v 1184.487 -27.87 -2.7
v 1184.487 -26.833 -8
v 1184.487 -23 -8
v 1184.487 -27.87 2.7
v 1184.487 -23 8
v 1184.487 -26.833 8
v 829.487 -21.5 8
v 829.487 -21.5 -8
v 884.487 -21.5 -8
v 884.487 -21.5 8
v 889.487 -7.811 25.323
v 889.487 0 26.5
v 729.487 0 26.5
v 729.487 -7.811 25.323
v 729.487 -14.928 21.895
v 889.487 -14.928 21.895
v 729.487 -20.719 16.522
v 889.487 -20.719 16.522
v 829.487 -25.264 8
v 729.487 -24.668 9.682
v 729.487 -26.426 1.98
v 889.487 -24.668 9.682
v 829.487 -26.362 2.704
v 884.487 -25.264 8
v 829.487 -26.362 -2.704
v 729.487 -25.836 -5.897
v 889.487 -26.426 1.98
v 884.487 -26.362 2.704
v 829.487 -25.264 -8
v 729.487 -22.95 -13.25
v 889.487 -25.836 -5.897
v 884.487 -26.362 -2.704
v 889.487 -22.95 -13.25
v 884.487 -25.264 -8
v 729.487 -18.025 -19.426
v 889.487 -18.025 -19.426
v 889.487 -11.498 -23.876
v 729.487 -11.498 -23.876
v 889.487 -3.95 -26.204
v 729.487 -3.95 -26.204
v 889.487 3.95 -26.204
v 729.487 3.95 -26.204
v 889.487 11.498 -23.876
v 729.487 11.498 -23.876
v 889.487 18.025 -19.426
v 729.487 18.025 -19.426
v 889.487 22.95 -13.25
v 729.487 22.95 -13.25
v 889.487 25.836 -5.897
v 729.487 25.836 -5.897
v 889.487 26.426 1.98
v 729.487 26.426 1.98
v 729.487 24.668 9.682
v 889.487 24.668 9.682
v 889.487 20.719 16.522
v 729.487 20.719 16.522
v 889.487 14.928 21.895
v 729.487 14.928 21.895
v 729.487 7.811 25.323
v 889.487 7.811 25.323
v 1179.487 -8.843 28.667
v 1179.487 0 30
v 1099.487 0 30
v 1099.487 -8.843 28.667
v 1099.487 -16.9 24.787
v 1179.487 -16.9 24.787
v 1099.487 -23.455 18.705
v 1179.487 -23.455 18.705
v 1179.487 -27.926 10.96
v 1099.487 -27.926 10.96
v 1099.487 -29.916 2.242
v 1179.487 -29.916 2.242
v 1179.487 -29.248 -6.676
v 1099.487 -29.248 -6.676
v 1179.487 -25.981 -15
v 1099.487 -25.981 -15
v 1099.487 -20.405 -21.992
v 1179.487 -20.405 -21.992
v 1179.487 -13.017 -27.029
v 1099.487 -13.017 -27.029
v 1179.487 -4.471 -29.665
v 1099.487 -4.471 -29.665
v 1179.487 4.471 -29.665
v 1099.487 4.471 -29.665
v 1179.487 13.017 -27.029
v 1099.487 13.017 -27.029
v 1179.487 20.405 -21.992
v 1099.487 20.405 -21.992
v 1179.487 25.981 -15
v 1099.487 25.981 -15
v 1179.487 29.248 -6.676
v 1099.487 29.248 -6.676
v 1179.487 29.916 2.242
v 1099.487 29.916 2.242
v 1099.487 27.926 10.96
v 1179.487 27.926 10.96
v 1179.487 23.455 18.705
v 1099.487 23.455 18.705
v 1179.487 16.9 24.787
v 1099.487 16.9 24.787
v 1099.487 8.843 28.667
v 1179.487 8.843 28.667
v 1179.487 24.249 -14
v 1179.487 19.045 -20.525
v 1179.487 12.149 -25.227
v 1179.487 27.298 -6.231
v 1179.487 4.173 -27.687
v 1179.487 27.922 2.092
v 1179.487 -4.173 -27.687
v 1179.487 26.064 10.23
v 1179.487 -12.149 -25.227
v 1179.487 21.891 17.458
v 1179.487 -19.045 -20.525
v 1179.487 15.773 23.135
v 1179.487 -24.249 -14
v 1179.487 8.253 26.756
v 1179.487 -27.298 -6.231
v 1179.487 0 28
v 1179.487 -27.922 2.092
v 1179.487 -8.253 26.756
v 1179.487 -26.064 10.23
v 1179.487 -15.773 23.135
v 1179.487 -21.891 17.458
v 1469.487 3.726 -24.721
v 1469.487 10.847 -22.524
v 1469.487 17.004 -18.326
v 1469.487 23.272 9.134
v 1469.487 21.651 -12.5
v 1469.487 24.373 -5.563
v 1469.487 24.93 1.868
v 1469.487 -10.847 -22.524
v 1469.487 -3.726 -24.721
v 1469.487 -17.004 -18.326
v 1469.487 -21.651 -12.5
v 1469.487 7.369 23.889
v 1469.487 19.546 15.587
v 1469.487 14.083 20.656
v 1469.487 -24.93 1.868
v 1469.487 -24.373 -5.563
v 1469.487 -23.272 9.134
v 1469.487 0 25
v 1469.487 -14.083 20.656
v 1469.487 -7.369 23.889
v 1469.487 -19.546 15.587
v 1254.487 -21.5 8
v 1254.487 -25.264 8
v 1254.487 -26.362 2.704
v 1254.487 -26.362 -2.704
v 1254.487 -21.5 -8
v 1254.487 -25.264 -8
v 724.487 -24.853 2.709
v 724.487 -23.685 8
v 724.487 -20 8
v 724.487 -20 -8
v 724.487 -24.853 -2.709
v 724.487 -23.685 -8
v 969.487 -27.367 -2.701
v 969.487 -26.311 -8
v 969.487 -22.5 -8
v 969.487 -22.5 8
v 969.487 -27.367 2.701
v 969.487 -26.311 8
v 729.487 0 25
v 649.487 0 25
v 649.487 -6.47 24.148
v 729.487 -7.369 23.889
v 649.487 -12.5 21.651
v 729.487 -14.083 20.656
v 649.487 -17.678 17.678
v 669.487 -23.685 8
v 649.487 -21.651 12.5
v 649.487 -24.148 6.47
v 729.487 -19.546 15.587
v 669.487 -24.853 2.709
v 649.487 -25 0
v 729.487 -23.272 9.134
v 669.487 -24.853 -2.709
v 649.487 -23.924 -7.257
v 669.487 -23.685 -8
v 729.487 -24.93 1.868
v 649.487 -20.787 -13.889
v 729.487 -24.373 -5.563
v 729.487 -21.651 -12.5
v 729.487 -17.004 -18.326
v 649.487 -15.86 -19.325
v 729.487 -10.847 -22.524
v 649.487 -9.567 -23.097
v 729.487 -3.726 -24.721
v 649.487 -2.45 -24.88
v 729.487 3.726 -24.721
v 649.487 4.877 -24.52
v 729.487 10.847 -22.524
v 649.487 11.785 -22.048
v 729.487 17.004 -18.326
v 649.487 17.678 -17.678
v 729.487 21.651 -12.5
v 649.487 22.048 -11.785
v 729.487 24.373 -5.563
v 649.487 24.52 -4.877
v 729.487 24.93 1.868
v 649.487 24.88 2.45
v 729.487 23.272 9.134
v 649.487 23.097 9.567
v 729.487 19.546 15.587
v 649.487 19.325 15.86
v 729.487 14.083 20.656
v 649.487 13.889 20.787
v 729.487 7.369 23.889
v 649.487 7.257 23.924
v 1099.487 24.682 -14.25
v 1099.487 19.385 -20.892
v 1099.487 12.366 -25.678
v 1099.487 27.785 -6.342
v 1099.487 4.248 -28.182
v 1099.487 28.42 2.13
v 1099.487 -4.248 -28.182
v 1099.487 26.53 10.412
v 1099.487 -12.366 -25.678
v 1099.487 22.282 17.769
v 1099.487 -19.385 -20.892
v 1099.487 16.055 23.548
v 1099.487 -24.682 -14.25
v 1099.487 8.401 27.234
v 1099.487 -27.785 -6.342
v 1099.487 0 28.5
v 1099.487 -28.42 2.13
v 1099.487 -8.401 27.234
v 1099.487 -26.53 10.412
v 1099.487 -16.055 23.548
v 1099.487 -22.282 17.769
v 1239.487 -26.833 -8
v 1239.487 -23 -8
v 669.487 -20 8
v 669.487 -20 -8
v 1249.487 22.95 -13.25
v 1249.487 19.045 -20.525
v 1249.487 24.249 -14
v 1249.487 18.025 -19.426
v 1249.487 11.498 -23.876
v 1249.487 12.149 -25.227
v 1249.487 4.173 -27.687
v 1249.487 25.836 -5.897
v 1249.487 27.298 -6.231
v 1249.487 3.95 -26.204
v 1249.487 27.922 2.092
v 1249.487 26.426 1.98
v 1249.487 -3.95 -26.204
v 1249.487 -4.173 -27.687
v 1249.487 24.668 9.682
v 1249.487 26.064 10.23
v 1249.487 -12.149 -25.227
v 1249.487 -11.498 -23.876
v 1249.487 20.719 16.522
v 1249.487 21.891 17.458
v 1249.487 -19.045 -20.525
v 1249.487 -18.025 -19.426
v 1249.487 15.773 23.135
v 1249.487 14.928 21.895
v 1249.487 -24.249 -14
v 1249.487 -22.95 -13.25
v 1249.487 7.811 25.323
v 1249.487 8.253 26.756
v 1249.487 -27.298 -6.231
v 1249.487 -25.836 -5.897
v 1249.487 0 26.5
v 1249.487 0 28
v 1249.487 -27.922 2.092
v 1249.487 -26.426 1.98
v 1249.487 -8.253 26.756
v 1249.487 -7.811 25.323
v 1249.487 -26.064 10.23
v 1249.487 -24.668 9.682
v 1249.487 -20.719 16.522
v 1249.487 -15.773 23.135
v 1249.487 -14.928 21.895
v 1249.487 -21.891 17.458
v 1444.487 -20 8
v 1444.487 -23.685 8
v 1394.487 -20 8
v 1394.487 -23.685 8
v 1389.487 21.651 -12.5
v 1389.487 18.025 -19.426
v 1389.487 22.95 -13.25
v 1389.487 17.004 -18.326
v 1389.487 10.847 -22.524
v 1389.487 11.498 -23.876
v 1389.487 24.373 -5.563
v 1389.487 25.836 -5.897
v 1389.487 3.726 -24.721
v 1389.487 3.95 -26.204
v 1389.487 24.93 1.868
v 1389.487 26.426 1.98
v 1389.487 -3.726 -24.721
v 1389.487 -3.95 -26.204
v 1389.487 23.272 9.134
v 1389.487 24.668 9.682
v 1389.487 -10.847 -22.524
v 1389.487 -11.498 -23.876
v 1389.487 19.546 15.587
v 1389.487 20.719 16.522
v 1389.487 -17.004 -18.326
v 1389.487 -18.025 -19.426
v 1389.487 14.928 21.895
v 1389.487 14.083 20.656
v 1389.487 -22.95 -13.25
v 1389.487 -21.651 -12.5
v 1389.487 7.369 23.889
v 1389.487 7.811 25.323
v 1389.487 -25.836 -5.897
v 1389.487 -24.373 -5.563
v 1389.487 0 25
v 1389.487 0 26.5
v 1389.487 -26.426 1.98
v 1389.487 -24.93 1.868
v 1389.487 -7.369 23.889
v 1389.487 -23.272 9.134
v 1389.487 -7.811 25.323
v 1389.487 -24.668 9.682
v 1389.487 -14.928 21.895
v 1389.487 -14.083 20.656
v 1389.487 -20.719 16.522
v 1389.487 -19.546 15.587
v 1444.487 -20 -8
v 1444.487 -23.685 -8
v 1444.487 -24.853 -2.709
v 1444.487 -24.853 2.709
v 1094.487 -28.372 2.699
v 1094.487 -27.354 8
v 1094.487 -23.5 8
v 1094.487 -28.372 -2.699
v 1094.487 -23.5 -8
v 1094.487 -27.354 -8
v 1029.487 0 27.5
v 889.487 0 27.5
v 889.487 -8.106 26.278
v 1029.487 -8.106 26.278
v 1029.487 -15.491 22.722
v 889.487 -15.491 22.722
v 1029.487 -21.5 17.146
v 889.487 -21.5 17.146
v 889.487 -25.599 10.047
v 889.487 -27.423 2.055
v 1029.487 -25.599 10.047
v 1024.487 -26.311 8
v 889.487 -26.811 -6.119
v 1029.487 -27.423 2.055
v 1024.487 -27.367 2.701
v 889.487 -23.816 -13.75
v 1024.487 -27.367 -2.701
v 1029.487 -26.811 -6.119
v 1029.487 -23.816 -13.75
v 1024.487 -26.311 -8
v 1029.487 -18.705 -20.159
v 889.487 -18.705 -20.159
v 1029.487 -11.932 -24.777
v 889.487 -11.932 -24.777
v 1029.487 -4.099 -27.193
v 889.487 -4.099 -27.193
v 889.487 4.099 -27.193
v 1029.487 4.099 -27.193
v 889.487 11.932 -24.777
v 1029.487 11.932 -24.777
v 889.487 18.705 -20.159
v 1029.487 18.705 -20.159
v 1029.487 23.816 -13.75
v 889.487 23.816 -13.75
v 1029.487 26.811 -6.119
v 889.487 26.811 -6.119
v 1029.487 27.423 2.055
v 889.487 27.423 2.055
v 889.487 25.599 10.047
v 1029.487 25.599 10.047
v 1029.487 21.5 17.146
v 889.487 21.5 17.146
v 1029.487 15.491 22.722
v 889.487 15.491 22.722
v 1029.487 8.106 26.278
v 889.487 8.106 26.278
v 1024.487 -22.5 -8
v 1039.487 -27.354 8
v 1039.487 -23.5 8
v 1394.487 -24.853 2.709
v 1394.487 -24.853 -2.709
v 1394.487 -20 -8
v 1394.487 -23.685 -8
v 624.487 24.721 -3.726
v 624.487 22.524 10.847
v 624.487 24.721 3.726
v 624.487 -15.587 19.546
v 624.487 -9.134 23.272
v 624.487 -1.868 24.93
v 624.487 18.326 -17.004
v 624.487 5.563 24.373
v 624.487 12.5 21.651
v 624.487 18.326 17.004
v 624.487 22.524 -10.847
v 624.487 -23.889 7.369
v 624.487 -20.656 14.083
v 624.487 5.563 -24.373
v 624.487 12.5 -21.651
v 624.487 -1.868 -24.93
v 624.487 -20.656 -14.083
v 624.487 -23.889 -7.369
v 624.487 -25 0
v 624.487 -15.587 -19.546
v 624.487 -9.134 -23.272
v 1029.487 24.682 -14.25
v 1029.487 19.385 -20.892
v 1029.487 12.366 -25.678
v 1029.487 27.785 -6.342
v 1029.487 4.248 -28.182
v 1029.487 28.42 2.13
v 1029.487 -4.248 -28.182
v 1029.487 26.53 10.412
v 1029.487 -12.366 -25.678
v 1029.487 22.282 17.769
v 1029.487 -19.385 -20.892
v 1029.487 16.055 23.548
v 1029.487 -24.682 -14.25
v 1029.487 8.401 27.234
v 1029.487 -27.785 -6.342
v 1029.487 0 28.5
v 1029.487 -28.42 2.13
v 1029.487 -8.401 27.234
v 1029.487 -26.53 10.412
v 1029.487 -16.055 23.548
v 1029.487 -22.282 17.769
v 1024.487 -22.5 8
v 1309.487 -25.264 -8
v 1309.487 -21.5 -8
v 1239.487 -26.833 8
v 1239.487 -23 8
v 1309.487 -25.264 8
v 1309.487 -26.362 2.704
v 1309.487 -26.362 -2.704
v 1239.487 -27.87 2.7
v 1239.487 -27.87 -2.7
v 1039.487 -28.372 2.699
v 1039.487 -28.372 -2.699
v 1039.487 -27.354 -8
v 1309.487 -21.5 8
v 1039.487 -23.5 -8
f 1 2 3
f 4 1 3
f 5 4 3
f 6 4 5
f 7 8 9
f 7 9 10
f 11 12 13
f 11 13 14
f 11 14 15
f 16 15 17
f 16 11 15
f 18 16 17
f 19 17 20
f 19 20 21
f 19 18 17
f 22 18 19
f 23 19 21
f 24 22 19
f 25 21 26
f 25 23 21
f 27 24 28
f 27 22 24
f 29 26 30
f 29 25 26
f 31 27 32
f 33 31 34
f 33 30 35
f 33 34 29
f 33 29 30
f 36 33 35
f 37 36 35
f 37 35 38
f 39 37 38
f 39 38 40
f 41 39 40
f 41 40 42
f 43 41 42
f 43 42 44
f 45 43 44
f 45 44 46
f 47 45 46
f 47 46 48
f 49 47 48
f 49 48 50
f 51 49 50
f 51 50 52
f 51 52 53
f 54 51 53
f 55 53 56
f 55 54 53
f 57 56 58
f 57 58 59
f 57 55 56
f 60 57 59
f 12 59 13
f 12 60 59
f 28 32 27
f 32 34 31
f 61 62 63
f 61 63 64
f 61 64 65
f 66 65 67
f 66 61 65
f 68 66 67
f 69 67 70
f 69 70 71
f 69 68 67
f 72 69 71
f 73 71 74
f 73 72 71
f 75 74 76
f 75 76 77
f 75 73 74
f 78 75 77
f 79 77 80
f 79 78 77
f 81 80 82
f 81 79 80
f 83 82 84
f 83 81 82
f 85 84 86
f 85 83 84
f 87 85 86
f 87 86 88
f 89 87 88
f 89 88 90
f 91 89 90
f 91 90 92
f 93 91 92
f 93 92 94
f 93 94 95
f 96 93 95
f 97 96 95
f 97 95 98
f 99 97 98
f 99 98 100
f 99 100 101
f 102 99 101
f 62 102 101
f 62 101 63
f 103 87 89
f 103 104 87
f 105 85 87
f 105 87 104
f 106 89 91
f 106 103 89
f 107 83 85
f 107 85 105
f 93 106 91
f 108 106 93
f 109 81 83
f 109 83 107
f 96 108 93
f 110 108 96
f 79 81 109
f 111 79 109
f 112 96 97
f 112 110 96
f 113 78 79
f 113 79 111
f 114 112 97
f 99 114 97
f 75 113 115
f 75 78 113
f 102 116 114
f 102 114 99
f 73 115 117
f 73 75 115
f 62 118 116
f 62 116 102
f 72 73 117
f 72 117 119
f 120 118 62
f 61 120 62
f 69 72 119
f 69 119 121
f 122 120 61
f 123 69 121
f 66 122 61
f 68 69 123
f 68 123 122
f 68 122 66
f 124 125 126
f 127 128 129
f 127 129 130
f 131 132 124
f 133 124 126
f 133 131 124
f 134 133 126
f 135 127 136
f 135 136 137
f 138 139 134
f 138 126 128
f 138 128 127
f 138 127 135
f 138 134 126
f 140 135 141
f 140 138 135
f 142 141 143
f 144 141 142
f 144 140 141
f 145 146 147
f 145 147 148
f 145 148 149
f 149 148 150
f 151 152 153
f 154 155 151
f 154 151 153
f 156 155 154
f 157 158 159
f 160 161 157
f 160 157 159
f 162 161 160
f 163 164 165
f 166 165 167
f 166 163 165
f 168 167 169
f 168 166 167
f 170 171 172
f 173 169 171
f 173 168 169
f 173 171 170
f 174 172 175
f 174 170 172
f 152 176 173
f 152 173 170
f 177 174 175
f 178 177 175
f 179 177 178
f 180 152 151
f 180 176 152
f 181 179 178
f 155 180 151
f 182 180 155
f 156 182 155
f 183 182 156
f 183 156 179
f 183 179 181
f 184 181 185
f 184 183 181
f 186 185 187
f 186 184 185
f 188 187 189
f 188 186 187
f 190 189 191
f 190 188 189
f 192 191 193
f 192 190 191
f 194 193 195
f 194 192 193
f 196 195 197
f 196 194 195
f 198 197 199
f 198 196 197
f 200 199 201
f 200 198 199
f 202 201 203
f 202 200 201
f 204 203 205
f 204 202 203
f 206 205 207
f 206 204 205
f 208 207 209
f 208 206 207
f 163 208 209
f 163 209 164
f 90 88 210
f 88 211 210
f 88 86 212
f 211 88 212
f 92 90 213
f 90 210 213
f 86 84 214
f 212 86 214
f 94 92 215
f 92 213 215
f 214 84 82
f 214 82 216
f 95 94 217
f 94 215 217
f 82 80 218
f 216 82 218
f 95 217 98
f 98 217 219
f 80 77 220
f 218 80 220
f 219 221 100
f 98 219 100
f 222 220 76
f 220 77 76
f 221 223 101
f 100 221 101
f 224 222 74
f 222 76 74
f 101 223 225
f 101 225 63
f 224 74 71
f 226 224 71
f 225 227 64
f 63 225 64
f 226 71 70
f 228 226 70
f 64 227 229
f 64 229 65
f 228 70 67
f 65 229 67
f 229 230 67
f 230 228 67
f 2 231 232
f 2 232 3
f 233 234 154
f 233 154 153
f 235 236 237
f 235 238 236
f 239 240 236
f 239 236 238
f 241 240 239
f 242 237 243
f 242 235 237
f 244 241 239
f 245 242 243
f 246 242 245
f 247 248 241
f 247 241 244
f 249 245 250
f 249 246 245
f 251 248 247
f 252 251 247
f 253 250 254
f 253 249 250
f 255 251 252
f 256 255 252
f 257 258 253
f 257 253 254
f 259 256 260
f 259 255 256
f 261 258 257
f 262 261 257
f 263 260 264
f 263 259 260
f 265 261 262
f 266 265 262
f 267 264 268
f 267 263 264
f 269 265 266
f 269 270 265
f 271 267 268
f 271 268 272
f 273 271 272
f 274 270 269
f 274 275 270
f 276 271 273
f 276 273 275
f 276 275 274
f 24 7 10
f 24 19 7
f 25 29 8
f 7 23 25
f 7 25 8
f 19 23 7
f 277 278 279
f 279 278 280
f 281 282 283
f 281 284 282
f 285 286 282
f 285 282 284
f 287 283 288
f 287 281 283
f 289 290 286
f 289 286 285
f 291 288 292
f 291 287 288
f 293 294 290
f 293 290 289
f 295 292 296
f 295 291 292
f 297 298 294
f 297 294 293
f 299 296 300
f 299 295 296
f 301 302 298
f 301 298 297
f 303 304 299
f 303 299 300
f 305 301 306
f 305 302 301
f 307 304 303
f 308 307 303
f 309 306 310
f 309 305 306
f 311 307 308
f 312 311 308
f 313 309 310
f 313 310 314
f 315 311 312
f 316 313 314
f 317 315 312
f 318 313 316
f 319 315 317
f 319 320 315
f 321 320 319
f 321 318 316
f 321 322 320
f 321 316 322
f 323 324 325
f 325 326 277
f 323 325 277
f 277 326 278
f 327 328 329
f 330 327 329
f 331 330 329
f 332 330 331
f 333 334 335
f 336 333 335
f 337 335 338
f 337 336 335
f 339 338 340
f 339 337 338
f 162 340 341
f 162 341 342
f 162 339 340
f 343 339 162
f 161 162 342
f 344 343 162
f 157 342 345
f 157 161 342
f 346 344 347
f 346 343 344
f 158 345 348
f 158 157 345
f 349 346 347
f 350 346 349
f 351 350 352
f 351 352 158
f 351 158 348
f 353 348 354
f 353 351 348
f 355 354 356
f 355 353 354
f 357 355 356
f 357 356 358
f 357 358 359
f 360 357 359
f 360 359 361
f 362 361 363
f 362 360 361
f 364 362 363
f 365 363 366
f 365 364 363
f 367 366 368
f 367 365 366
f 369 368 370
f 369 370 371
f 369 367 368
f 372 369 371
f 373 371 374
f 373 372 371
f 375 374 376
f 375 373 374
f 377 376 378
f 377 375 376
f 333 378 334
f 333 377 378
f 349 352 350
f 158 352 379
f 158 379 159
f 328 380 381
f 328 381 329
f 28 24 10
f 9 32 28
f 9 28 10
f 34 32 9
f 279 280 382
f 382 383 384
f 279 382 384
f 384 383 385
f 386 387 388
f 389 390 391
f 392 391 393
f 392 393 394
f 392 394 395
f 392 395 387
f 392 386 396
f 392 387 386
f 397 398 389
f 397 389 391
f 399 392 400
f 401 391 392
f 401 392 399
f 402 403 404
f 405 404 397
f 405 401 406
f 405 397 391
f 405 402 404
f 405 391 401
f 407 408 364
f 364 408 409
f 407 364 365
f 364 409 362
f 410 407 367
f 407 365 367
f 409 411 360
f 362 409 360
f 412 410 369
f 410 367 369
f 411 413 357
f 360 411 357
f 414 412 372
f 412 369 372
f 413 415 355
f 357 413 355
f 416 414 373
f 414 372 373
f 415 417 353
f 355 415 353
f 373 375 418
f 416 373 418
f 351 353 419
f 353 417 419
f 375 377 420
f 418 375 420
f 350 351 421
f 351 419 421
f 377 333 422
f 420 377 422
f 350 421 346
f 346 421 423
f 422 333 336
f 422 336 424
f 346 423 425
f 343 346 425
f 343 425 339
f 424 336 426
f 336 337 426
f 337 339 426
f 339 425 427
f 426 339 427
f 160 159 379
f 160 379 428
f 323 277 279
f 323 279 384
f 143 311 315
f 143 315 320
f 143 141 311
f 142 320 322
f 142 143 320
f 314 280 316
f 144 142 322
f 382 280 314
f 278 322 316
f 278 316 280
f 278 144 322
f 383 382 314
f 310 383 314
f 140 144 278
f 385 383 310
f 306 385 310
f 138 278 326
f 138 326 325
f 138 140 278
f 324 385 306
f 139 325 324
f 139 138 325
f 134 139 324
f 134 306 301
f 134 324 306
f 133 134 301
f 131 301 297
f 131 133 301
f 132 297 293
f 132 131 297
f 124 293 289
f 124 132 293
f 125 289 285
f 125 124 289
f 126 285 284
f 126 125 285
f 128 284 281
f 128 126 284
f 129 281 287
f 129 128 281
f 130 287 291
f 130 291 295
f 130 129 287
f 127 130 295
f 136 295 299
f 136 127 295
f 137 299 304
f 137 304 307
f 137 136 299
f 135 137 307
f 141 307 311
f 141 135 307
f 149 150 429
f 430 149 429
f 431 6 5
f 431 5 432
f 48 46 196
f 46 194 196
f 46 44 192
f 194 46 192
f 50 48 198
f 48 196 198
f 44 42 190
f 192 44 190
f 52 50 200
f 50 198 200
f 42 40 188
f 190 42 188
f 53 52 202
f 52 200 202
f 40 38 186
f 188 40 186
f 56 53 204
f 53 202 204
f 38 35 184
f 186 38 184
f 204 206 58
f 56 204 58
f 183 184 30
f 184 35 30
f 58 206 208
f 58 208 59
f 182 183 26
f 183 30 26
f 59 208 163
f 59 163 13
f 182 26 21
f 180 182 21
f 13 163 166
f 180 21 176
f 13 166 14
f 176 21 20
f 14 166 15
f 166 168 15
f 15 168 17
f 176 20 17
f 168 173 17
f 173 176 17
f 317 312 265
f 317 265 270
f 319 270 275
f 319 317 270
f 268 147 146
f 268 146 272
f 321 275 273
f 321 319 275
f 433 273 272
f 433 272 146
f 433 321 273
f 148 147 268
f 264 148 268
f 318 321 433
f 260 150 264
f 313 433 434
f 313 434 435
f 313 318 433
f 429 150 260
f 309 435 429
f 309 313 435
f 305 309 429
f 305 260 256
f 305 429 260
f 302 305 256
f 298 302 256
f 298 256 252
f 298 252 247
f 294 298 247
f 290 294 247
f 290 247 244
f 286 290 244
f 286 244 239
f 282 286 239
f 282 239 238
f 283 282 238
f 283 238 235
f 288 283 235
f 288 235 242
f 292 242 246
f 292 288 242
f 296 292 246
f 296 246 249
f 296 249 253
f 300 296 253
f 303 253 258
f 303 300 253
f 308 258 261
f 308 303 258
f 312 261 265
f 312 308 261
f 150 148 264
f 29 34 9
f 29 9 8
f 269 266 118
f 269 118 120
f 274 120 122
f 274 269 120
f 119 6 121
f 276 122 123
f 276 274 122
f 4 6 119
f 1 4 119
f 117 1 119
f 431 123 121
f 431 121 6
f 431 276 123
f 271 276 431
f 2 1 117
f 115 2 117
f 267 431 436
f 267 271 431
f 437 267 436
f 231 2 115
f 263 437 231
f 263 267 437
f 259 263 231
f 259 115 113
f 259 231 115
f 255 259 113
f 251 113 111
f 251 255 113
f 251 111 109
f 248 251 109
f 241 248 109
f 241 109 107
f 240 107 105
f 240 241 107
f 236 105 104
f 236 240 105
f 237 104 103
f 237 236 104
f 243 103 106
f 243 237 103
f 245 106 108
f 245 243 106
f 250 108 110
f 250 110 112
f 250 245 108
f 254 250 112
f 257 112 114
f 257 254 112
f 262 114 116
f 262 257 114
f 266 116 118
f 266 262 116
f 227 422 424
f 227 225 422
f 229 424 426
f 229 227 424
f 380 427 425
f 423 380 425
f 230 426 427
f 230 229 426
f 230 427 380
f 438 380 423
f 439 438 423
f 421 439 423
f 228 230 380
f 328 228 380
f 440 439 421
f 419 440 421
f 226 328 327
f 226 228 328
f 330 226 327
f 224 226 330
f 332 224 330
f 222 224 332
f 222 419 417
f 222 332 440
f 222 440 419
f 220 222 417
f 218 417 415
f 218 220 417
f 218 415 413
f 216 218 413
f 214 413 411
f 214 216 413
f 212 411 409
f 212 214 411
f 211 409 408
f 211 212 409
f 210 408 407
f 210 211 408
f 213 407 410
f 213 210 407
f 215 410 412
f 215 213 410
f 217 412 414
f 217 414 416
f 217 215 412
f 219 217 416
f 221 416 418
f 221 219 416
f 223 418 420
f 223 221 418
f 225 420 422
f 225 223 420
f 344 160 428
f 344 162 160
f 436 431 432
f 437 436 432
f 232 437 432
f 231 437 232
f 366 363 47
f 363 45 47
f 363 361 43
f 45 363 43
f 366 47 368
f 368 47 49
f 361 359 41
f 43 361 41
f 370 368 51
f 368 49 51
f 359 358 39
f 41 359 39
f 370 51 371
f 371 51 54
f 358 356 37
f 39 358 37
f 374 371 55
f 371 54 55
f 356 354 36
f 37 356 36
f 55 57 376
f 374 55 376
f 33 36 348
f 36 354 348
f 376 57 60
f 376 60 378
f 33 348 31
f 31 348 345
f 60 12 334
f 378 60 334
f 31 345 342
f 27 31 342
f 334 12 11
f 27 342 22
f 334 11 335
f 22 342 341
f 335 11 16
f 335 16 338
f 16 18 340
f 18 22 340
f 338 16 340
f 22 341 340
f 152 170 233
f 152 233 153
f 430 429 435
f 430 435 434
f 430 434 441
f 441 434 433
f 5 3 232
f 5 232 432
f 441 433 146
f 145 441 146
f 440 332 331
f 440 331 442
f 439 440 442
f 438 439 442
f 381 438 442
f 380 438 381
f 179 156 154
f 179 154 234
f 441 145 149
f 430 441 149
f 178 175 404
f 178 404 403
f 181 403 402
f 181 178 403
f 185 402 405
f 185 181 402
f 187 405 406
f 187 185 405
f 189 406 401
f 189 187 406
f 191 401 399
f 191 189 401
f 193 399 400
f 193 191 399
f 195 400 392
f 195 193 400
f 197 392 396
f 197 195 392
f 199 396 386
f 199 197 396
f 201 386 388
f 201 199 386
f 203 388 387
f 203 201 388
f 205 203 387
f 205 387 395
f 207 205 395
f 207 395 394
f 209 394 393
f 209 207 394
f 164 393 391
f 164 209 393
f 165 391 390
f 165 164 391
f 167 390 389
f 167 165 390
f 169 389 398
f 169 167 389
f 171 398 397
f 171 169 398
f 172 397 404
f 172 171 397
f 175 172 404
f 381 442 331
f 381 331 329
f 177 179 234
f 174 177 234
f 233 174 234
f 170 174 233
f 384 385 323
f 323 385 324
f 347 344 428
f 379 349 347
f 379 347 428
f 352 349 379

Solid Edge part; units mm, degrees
sketch "Sketch1" plane through (0, 0, 0) normal (0, -1, 0) x (1, 0, 0)
  line L0 (1469.4867, 25) -> (1469.4867, 0)
  line L1 (1469.4867, 0) -> (649.4867, 0)
  line L2 (649.4867, 0) -> (649.4867, 25)
  line L3 (649.4867, 25) -> (729.4867, 25)
  line L4 (729.4867, 25) -> (729.4867, 26.5)
  line L5 (729.4867, 26.5) -> (889.4867, 26.5)
  line L6 (889.4867, 26.5) -> (889.4867, 27.5)
  line L7 (889.4867, 27.5) -> (1029.4867, 27.5)
  line L8 (1029.4867, 27.5) -> (1029.4867, 28.5)
  line L9 (1029.4867, 28.5) -> (1099.4867, 28.5)
  line L10 (1099.4867, 28.5) -> (1099.4867, 30)
  line L11 (1099.4867, 30) -> (1179.4867, 30)
  line L12 (1179.4867, 30) -> (1179.4867, 28)
  line L13 (1179.4867, 28) -> (1249.4867, 28)
  line L14 (1249.4867, 28) -> (1249.4867, 26.5)
  line L15 (1249.4867, 26.5) -> (1389.4867, 26.5)
  line L16 (1389.4867, 26.5) -> (1389.4867, 25)
  line L17 (1389.4867, 25) -> (1469.4867, 25)
revolve "RevolvedProtrusion1" add sketch "Sketch1" angle 360 about axis through (0, 0, 0) along (1, 0, 0)
sketch "Sketch2" plane through (689.4867, -25, 0) normal (0, -1, 0) x (-1, 0, 0)
  line L0 (20, -8) -> (-35, -8)
  line L1 (-35, -8) -> (-35, 0)
  line L2 (-35, 0) -> (-35, 8)
  line L3 (-35, 8) -> (20, 8)
  line L4 (20, 8) -> (20, -8)
extrude "Cutout1" cut sketch "Sketch2" against normal blind 5
sketch "Sketch3" plane through (809.4867, -26.5, 0) normal (0, -1, 0) x (-1, 0, 0)
  line L0 (-75, 0) -> (-75, 8)
  line L1 (-75, 8) -> (-20, 8)
  line L2 (-20, 8) -> (-20, -8)
  line L3 (-20, -8) -> (-75, -8)
  line L4 (-75, -8) -> (-75, 0)
  dimension "D1" = 55
  dimension "D2" = 60
extrude "Cutout2" cut sketch "Sketch3" against normal blind 5
sketch "Sketch4" plane through (959.4867, -27.5, 0) normal (0, -1, 0) x (-1, 0, 0)
  line L0 (-65, 0) -> (-65, 8)
  line L1 (-65, 8) -> (-10, 8)
  line L2 (-10, 8) -> (-10, -8)
  line L3 (-10, -8) -> (-65, -8)
  line L4 (-65, -8) -> (-65, 0)
  dimension "D1" = 55
  dimension "D2" = 16
  dimension "D3" = 60
extrude "Keyway_Thickness" cut sketch "Sketch4" against normal blind 5
sketch "Sketch5" plane through (1064.4867, -28.5, 0) normal (0, -1, 0) x (-1, 0, 0)
  line L0 (-30, 0) -> (-30, 8)
  line L1 (-30, 8) -> (25, 8)
  line L2 (25, 8) -> (25, -8)
  line L3 (25, -8) -> (-30, -8)
  line L4 (-30, -8) -> (-30, 0)
  dimension "D1" = 55
  dimension "D2" = 16
  dimension "D3" = 60
extrude "Cutout3" cut sketch "Sketch5" against normal blind 5
sketch "Sketch6" plane through (1214.4867, -28, 0) normal (0, -1, 0) x (-1, 0, 0)
  line L0 (-25, 0) -> (-25, 8)
  line L1 (-25, 8) -> (30, 8)
  line L2 (30, 8) -> (30, -8)
  line L3 (30, -8) -> (-25, -8)
  line L4 (-25, -8) -> (-25, 0)
  dimension "D1" = 16
  dimension "D2" = 55
  dimension "D3" = 60
extrude "Cutout4" cut sketch "Sketch6" against normal blind 5
sketch "Sketch7" plane through (1319.4867, -26.5, 0) normal (0, -1, 0) x (-1, 0, 0)
  line L0 (65, 0) -> (65, 8)
  line L1 (65, 8) -> (10, 8)
  line L2 (10, 8) -> (10, -8)
  line L3 (10, -8) -> (65, -8)
  line L4 (65, -8) -> (65, 0)
  dimension "D1" = 55
  dimension "D2" = 16
  dimension "D3" = 60
extrude "Cutout5" cut sketch "Sketch7" against normal blind 5
sketch "Sketch8" plane through (1429.4867, -25, 0) normal (0, -1, 0) x (-1, 0, 0)
  line L0 (35, 0) -> (35, 8)
  line L1 (35, 8) -> (-20, 8)
  line L2 (-20, 8) -> (-20, -8)
  line L3 (-20, -8) -> (35, -8)
  line L4 (35, -8) -> (35, 0)
  dimension "D1" = 55
  dimension "D2" = 16
  dimension "D3" = 60
extrude "Cutout6" cut sketch "Sketch8" against normal blind 5
sketch "Sketch9" plane through (1469.4867, 0, 0) normal (1, 0, 0) x (0, 1, 0)
  circle A0 centre (0, 0) radius 25
  dimension "D1" = 50
extrude "Protrusion1" add sketch "Sketch9" against normal blind 25
sketch "Sketch10" plane through (649.4867, 0, 0) normal (-1, 0, 0) x (0, -1, 0)
  circle A0 centre (0, 0) radius 25
  dimension "D1" = 50
extrude "Extruded_for_Bearing_A" add sketch "Sketch10" along normal blind 25
